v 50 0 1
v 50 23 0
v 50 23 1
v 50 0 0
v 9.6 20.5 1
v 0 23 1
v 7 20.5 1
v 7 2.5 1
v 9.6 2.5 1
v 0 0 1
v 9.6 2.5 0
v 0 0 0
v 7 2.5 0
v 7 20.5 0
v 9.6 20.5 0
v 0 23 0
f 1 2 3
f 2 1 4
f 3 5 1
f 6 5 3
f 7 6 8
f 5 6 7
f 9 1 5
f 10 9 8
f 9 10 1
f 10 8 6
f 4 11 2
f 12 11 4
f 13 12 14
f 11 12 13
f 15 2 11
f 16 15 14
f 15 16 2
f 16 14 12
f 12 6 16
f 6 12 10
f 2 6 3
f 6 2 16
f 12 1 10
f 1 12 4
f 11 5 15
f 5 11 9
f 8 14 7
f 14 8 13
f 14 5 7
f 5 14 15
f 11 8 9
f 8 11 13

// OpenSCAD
// file: ../tix-clock-plate.scad
module dotstarMatrixTixClockPlate()
{
    difference()
    {
        xLength = dotstarMatrixTixClockPlate_xLength();
        yLength = dotstarMatrixTixClockPlate_yLength();

        cube([xLength, 23, 1]);

        dotstarMatrixTixClockPlate_cutouts();
    }
}

module dotstarMatrixTixClockPlate_cutouts(plateLength_x, plateLength_y)
{
    plateLength_x = dotstarMatrixTixClockPlate_xLength();
    plateLength_y = dotstarMatrixTixClockPlate_yLength();

    cutoutLengthX = 2.6;
    cutoutLengthY = 18;

    xTranslate = 7;
    yTranslate = (plateLength_y - cutoutLengthY) / 2.0;

    echo("yt:", yTranslate);

    // hour tens cutout
    translate([xTranslate, yTranslate, -0.01])
    cube([cutoutLengthX, cutoutLengthY, 10.02]);

    // hour ones cutout
    dotstarMatrixTixClockPlate_cutouts_hourOnes(cutoutLengthX = cutoutLengthX, cutoutLengthY = cutoutLengthY);
}

module dotstarMatrixTixClockPlate_cutouts_hourOnes(cutoutLengthX, cutoutLengthY)
{

}

function dotstarMatrixTixClockPlate_xLength() = 50;

function dotstarMatrixTixClockPlate_yLength() = 23;
// main file
use <../tix-clock-plate.scad>

dotstarMatrixTixClockPlate();
